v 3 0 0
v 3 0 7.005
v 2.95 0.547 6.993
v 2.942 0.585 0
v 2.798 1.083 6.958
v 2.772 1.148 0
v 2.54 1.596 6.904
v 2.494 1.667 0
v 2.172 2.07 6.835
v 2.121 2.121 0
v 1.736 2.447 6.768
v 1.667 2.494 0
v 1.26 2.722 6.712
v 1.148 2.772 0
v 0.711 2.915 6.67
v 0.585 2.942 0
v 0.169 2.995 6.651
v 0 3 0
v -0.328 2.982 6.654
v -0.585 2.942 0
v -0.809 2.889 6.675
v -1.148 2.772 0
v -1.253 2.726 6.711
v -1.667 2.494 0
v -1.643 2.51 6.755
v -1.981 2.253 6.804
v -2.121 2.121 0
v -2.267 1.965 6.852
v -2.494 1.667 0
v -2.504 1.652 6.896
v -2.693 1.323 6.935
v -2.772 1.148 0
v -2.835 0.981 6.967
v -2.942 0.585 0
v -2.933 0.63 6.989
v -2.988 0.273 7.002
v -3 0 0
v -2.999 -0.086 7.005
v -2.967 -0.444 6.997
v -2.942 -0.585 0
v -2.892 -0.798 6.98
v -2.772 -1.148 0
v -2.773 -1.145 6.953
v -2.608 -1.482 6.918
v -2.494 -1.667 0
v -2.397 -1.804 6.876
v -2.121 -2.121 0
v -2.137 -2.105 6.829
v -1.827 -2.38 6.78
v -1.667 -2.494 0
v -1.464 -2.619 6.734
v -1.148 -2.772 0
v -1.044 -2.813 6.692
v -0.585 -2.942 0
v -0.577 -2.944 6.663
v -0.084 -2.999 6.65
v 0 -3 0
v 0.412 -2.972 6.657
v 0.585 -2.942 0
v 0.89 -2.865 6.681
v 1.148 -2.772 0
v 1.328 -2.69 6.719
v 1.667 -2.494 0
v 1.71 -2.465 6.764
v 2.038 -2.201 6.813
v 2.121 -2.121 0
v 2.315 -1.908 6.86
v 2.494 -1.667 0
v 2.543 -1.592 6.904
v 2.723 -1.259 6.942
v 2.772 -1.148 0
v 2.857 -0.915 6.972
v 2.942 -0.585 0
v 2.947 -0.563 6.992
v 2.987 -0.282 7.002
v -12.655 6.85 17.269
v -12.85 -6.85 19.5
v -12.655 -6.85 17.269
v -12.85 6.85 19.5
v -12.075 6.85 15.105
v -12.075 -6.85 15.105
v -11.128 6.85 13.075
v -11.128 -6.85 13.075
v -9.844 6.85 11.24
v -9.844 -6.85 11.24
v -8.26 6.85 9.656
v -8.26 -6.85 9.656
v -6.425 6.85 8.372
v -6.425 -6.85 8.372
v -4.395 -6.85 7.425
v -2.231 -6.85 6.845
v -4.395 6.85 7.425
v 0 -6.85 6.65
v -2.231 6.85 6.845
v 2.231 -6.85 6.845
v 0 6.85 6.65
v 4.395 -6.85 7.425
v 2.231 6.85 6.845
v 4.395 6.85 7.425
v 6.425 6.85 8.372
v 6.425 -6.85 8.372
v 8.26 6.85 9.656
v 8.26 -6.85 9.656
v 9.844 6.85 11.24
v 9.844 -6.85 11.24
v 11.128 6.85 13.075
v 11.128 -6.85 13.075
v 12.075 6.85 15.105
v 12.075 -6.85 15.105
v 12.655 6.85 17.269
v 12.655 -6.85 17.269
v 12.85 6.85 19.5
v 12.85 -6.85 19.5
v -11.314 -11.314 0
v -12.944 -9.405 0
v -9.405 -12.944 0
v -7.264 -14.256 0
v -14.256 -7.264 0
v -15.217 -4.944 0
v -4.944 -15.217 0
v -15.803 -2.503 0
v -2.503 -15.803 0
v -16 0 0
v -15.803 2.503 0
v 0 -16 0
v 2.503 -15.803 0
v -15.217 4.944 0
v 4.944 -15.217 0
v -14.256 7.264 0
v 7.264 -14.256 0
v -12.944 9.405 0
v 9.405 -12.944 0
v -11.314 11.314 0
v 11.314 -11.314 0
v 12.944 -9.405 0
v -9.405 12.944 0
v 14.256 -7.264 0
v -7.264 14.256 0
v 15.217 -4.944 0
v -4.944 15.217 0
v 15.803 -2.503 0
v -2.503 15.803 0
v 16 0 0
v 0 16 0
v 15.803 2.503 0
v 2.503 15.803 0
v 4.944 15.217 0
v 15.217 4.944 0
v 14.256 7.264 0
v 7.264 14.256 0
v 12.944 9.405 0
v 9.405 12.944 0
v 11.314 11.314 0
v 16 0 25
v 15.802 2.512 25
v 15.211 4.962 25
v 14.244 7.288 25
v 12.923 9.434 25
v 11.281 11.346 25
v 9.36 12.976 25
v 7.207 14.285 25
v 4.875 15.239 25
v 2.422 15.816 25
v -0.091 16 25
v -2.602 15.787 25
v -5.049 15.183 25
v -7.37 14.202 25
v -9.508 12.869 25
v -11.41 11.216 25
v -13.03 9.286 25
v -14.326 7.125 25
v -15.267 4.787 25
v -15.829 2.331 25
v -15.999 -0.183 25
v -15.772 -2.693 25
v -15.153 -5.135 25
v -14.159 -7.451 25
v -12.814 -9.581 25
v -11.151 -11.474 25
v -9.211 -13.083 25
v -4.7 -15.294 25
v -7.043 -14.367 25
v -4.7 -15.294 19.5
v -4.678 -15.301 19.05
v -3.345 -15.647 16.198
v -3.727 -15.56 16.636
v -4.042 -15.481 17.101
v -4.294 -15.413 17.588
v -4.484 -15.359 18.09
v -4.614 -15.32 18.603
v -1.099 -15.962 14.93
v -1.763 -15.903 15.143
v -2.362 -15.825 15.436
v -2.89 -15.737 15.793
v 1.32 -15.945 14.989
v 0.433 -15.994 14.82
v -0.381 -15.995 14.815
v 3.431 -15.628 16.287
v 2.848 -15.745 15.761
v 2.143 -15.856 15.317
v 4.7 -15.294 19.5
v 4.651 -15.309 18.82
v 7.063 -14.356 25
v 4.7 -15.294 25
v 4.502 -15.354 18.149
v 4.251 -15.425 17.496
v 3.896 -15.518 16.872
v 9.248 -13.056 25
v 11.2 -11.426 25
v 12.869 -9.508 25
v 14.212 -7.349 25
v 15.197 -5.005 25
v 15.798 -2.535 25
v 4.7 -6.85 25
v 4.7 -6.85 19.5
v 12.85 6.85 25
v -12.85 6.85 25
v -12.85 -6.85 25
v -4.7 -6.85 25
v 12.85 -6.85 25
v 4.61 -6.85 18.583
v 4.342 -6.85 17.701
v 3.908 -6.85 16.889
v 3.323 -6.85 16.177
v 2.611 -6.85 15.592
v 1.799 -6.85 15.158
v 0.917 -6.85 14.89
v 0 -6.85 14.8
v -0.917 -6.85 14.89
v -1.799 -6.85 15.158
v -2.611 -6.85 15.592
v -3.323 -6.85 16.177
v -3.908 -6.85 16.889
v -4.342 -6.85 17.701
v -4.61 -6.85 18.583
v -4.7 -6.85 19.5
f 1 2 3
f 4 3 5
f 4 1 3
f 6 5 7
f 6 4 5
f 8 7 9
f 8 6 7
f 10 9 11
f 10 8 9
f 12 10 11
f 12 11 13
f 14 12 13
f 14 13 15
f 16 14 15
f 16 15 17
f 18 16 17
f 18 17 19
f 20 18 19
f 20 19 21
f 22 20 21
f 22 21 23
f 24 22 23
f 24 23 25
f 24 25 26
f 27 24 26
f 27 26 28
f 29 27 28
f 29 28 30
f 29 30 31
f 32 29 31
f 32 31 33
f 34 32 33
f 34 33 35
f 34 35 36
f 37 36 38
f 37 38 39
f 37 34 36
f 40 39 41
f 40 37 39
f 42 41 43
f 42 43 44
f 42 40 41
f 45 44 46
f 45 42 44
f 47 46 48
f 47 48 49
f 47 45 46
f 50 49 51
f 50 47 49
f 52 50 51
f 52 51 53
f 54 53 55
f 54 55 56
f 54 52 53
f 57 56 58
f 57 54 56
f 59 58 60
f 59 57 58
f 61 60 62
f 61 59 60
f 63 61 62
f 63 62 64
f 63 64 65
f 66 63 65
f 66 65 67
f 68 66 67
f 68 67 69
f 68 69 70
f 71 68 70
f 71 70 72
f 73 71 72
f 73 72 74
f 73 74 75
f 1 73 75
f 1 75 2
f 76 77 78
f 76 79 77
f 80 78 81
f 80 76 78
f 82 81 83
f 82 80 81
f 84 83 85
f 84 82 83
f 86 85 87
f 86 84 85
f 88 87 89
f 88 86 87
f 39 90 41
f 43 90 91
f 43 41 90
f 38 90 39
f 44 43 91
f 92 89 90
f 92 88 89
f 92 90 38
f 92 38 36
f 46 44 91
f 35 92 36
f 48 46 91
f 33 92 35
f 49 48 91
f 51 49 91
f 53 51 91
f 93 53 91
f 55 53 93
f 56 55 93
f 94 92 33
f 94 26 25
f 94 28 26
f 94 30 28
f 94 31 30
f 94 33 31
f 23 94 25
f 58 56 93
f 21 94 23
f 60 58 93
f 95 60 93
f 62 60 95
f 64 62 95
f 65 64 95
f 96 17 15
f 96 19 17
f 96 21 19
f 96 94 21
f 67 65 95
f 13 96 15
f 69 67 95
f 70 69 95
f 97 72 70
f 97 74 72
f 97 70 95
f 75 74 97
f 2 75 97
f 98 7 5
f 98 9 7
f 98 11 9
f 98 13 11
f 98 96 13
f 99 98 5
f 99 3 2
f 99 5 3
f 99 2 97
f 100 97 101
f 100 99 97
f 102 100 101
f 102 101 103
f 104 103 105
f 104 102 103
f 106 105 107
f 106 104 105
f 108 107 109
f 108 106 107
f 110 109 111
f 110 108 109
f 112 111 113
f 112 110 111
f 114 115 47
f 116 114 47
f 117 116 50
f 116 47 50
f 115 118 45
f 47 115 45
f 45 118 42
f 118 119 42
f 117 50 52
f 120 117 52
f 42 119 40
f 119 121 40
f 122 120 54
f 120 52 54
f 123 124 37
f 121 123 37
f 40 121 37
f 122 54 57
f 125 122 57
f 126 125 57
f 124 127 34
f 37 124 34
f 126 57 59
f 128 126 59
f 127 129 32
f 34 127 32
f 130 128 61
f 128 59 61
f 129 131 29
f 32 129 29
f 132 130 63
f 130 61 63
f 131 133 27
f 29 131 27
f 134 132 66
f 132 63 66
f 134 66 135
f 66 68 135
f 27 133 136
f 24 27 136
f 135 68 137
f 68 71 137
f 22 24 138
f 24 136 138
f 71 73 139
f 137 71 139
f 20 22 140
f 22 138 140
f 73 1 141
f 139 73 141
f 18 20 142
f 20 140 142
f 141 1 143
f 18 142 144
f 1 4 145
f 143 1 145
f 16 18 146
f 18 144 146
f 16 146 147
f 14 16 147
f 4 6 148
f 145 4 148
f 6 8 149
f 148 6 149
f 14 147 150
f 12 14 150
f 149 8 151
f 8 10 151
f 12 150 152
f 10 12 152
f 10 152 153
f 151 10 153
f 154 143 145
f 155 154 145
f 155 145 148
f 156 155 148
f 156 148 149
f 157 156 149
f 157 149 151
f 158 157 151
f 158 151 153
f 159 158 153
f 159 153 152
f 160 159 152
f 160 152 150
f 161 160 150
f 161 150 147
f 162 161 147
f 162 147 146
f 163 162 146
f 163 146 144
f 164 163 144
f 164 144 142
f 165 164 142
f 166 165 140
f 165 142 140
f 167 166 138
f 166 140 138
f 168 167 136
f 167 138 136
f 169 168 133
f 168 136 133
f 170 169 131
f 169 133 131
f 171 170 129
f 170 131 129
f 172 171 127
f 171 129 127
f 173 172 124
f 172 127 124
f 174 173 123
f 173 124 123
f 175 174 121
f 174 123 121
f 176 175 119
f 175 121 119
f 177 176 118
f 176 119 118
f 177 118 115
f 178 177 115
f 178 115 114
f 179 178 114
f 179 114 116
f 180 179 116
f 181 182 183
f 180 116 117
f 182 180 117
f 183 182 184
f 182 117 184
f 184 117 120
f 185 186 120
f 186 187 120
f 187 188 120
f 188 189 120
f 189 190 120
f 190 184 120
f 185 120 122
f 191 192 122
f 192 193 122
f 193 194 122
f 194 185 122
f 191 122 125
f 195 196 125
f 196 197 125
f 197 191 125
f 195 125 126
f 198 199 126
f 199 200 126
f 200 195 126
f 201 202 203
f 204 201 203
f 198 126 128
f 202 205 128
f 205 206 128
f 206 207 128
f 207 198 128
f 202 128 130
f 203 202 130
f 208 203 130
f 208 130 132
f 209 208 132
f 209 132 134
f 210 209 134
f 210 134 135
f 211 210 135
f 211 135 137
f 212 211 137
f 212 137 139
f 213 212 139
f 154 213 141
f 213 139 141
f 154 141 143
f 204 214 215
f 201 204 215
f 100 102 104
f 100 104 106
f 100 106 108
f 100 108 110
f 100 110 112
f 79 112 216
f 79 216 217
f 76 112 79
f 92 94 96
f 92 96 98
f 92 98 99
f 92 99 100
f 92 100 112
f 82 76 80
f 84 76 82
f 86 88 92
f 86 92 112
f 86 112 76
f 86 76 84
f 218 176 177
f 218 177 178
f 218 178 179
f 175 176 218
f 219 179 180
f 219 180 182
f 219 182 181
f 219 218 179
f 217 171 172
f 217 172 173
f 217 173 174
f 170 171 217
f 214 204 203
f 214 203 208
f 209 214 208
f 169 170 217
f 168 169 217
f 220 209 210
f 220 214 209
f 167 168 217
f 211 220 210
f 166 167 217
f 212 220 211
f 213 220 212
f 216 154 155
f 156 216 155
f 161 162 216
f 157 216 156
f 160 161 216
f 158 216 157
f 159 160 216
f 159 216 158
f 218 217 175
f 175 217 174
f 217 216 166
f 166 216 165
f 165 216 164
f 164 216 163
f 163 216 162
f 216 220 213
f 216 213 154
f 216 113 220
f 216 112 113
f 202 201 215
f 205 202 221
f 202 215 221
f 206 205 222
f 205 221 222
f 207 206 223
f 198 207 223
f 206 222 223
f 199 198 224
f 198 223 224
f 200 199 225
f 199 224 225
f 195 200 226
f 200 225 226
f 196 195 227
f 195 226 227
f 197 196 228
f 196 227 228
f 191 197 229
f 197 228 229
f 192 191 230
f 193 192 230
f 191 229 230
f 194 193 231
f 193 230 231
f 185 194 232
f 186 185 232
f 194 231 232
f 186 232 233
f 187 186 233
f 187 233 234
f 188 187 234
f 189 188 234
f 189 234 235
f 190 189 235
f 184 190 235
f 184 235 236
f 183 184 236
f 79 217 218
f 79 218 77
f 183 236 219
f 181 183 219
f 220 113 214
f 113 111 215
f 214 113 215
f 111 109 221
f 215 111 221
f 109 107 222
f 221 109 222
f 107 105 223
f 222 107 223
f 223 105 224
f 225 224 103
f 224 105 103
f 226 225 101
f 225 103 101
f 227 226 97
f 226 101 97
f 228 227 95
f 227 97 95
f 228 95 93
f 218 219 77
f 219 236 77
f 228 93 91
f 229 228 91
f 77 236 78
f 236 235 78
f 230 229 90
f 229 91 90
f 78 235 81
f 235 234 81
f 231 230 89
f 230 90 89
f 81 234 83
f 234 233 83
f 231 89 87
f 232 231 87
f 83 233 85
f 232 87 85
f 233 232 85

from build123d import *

# Parameters (mm, degrees)
SKETCH1_R               = 16
SKETCH1_R_2             = 3
BOSS_EXTRUDE1_DEPTH     = 25
CUT_EXTRUDE1_DEPTH      = 6.85
CUT_EXTRUDE2_REACH      = 35.719
CUT_EXTRUDE2_END_RADIUS = 16


with BuildPart() as part:
    # Sketch1 → Boss-Extrude1 (new body)
    with BuildSketch(Plane.XY):
        Circle(SKETCH1_R)
        Circle(SKETCH1_R_2, mode=Mode.SUBTRACT)
    extrude(amount=BOSS_EXTRUDE1_DEPTH)

    # Sketch2 → Cut-Extrude1 (cut, symmetric)
    with BuildSketch(Plane(origin=(0, 0, 0), x_dir=(1, 0, 0), z_dir=(0, 1, 0))):
        with BuildLine():
            Line((-12.85, -25), (-12.85, -19.5))
            ThreePointArc((-12.85, -19.5), (0, -6.65), (12.85, -19.5))
            Line((12.85, -19.5), (12.85, -25))
            Line((12.85, -25), (-12.85, -25))
        make_face()
    extrude(amount=CUT_EXTRUDE1_DEPTH, both=True, mode=Mode.SUBTRACT)

    # Cut-Extrude2: up to this cylinder (the profile starts inside it)
    cut_extrude2_end = Plane(origin=(0, 0, 20.344451), z_dir=(0, 0, -1)) * Cylinder(CUT_EXTRUDE2_END_RADIUS, 104.438, mode=Mode.PRIVATE)
    # Sketch3 → Cut-Extrude2 (cut, up to the surface)
    with BuildSketch(Plane(origin=(0, 0, 0), x_dir=(1, 0, 0), z_dir=(0, 1, 0)), mode=Mode.PRIVATE) as cut_extrude2_sk1:
        with BuildLine():
            Line((-4.7, -19.5), (-4.7, -25))
            Line((-4.7, -25), (4.7, -25))
            Line((4.7, -25), (4.7, -19.5))
            ThreePointArc((4.7, -19.5), (0, -14.8), (-4.7, -19.5))
        make_face()
    cut_extrude2_tool1 = extrude(cut_extrude2_sk1.sketch, amount=-CUT_EXTRUDE2_REACH, mode=Mode.PRIVATE) & cut_extrude2_end
    add(cut_extrude2_tool1.solids().sort_by_distance((0, 0, 20.344451))[0], mode=Mode.SUBTRACT)


solid = part.part
